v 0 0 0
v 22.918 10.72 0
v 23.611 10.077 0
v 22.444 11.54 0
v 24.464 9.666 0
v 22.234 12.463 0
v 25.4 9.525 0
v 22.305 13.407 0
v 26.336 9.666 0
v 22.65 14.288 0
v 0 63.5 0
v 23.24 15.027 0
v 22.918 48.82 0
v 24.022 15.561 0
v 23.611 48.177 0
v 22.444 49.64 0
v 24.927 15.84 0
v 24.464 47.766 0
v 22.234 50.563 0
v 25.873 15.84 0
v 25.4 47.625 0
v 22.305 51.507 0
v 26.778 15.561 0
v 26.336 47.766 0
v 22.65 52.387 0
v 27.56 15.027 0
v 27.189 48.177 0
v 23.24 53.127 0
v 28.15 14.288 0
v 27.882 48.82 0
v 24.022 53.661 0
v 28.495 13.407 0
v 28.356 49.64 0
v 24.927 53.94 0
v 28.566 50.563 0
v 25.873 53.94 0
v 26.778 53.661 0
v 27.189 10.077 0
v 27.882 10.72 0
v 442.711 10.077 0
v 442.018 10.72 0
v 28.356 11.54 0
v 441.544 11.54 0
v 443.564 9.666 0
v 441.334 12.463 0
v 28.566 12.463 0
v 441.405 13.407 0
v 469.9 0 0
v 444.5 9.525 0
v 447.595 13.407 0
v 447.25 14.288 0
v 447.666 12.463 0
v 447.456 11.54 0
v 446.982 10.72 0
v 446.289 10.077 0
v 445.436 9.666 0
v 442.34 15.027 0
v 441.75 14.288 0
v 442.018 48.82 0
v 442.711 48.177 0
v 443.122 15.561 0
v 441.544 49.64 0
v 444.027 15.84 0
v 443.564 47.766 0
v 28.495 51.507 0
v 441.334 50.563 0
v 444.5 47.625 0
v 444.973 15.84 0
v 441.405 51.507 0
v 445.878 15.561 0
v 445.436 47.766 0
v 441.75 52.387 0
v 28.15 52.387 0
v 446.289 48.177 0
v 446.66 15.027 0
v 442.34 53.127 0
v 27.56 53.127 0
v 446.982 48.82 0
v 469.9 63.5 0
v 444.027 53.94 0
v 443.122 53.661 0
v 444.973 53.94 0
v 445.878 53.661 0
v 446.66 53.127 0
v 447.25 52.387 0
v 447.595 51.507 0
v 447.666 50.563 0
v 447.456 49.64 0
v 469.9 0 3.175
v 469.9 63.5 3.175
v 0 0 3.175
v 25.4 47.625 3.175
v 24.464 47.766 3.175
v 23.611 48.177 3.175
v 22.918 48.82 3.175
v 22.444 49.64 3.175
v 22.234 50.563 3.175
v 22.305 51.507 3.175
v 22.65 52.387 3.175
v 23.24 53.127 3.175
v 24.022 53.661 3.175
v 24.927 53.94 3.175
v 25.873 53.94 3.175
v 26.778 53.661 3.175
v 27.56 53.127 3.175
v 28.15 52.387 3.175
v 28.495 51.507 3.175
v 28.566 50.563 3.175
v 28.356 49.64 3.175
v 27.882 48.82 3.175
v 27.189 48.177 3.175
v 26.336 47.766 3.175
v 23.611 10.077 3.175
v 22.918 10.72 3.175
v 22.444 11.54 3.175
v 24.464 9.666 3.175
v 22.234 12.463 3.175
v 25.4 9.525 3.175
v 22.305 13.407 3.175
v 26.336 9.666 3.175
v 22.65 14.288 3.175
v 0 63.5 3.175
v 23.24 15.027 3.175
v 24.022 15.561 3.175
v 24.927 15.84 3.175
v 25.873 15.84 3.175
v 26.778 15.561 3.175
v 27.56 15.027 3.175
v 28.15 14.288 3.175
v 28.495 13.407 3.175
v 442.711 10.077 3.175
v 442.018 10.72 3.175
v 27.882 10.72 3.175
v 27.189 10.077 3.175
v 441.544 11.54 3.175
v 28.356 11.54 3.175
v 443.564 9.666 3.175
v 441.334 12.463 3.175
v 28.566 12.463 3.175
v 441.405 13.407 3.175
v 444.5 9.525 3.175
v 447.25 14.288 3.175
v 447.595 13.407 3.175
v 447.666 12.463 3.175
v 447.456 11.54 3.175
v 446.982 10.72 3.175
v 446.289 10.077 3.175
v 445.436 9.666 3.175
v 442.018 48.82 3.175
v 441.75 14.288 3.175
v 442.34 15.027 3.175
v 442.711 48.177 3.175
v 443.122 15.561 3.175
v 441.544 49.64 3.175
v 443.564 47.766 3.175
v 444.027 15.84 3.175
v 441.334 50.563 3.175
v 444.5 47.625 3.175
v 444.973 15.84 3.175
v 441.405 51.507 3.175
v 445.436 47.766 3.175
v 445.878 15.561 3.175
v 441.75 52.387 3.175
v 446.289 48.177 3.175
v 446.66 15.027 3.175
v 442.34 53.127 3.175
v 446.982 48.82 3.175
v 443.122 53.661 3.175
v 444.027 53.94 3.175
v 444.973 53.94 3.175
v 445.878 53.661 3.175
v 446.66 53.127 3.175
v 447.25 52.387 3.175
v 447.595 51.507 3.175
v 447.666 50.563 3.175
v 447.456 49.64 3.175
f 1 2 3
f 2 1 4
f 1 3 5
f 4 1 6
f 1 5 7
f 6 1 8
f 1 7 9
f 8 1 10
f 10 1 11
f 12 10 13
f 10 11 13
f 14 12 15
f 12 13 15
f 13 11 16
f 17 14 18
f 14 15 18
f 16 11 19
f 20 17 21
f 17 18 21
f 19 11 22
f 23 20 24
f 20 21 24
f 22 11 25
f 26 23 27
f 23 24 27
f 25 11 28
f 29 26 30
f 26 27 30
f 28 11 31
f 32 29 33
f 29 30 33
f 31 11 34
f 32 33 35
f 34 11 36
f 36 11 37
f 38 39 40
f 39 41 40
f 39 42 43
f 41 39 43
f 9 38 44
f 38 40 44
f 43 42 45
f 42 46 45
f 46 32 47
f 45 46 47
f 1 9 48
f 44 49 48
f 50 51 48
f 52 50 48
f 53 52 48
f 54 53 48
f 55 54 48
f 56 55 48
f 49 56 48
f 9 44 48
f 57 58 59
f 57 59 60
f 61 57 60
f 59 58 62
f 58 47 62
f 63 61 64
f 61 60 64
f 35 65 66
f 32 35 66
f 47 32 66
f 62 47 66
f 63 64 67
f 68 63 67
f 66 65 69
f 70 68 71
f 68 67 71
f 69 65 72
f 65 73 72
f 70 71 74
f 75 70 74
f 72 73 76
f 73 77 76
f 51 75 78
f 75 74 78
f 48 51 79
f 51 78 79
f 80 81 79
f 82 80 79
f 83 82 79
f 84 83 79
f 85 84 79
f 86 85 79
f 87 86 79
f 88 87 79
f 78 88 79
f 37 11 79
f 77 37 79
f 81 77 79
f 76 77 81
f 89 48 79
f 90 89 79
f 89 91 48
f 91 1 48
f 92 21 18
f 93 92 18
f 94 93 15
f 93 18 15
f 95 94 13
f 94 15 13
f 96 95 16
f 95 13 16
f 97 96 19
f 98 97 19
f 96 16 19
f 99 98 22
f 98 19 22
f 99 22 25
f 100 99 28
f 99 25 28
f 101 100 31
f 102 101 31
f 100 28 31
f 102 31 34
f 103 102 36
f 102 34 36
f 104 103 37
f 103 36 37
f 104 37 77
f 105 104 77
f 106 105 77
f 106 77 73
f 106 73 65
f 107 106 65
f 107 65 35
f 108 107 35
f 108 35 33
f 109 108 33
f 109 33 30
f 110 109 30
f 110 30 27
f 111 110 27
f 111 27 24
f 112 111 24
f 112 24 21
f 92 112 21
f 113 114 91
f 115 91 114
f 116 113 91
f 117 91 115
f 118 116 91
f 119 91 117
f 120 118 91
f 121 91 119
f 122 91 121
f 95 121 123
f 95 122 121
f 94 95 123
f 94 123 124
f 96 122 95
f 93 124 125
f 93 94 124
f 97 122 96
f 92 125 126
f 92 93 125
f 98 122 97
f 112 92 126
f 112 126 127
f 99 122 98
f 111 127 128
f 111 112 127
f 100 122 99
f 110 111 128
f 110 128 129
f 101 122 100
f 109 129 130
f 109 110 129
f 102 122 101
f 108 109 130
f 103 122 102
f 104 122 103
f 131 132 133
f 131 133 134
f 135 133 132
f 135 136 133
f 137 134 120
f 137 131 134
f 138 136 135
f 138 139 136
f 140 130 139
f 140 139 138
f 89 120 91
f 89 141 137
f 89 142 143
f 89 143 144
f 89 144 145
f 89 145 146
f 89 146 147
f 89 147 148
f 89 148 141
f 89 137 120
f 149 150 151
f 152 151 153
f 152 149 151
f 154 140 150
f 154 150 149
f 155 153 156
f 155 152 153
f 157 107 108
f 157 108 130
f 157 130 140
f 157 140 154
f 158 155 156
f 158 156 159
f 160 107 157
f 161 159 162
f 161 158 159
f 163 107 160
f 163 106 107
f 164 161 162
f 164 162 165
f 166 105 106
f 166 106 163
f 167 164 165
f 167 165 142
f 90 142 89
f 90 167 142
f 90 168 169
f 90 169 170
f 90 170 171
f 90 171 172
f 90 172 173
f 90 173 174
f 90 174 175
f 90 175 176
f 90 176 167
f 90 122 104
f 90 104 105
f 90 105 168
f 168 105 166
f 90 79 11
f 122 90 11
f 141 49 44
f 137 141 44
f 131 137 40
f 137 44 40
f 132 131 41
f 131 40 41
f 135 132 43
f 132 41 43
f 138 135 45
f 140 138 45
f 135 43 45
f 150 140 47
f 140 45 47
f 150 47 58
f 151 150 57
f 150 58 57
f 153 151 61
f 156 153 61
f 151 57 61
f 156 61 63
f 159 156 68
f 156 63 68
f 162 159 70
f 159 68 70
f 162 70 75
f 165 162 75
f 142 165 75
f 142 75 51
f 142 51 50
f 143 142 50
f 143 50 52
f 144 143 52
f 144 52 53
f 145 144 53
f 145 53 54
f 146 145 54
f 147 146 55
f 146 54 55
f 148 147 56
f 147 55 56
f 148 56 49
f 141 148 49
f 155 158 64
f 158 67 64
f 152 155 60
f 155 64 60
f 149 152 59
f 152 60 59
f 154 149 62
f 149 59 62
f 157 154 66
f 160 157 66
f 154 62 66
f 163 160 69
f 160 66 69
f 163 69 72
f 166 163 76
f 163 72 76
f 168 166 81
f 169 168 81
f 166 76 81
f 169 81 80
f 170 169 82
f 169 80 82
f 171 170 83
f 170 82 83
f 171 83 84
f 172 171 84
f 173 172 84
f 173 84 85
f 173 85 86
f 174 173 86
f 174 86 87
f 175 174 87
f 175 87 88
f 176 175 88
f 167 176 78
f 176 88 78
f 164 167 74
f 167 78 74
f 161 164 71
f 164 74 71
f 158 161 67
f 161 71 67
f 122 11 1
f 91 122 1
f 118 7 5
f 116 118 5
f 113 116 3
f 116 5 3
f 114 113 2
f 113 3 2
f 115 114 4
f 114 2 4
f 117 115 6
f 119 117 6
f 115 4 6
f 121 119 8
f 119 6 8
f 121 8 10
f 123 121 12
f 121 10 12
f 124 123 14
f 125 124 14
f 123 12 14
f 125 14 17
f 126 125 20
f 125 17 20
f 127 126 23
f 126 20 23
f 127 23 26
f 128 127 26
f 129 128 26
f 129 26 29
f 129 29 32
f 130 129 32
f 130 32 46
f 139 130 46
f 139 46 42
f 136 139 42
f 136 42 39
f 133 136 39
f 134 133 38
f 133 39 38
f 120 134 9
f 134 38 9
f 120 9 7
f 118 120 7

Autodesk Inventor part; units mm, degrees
ref_plane "YZ Plane" through (0, 0, 0) normal (1, 0, 0) x (0, 1, 0)
ref_plane "XZ Plane" through (0, 0, 0) normal (0, 1, 0) x (-1, 0, 0)
ref_plane "XY Plane" through (0, 0, 0) normal (0, 0, 1) x (1, 0, 0)
sketch "Sketch1" plane through (0, 0, 0) normal (0, 0, 1) x (1, 0, 0)
  line L0 (0, 0) -> (469.9, 0)
  line L1 (469.9, 0) -> (469.9, 63.5)
  line L2 (469.9, 63.5) -> (0, 63.5)
  line L3 (0, 63.5) -> (0, 0)
  dimension "d0" = 469.9
  dimension "d1" = 63.5
extrude "Extrusion1" add sketch "Sketch1" along normal blind 3.175
sketch "Sketch2" plane through (0, 0, 3.175) normal (0, 0, 1) x (1, 0, 0)
  line L0 (0, 0) -> (469.9, 0) projected
  line L1 (469.9, 0) -> (469.9, 63.5) projected
  line L2 (469.9, 63.5) -> (0, 63.5) projected
  line L3 (0, 63.5) -> (0, 0) projected
  point P0 (25.4, 50.8)
  point P1 (25.4, 12.7)
  point P2 (444.5, 12.7)
  point P3 (444.5, 50.8)
  dimension "d4" = 25.4
  dimension "d6" = 12.7
  dimension "d7" = 25.4
  dimension "d9" = 25.4
  dimension "d10" = 25.4
  dimension "d11" = 12.7
  dimension "d19" = 50.8
  dimension "d20" = 50.8
hole "Hole1" at (25.4, 50.8, 3.175) at (25.4, 12.7, 3.175) at (444.5, 12.7, 3.175) at (444.5, 50.8, 3.175) direction (0, 0, -1) diameter 6.35 end through all
properties part number "polycarb back"
